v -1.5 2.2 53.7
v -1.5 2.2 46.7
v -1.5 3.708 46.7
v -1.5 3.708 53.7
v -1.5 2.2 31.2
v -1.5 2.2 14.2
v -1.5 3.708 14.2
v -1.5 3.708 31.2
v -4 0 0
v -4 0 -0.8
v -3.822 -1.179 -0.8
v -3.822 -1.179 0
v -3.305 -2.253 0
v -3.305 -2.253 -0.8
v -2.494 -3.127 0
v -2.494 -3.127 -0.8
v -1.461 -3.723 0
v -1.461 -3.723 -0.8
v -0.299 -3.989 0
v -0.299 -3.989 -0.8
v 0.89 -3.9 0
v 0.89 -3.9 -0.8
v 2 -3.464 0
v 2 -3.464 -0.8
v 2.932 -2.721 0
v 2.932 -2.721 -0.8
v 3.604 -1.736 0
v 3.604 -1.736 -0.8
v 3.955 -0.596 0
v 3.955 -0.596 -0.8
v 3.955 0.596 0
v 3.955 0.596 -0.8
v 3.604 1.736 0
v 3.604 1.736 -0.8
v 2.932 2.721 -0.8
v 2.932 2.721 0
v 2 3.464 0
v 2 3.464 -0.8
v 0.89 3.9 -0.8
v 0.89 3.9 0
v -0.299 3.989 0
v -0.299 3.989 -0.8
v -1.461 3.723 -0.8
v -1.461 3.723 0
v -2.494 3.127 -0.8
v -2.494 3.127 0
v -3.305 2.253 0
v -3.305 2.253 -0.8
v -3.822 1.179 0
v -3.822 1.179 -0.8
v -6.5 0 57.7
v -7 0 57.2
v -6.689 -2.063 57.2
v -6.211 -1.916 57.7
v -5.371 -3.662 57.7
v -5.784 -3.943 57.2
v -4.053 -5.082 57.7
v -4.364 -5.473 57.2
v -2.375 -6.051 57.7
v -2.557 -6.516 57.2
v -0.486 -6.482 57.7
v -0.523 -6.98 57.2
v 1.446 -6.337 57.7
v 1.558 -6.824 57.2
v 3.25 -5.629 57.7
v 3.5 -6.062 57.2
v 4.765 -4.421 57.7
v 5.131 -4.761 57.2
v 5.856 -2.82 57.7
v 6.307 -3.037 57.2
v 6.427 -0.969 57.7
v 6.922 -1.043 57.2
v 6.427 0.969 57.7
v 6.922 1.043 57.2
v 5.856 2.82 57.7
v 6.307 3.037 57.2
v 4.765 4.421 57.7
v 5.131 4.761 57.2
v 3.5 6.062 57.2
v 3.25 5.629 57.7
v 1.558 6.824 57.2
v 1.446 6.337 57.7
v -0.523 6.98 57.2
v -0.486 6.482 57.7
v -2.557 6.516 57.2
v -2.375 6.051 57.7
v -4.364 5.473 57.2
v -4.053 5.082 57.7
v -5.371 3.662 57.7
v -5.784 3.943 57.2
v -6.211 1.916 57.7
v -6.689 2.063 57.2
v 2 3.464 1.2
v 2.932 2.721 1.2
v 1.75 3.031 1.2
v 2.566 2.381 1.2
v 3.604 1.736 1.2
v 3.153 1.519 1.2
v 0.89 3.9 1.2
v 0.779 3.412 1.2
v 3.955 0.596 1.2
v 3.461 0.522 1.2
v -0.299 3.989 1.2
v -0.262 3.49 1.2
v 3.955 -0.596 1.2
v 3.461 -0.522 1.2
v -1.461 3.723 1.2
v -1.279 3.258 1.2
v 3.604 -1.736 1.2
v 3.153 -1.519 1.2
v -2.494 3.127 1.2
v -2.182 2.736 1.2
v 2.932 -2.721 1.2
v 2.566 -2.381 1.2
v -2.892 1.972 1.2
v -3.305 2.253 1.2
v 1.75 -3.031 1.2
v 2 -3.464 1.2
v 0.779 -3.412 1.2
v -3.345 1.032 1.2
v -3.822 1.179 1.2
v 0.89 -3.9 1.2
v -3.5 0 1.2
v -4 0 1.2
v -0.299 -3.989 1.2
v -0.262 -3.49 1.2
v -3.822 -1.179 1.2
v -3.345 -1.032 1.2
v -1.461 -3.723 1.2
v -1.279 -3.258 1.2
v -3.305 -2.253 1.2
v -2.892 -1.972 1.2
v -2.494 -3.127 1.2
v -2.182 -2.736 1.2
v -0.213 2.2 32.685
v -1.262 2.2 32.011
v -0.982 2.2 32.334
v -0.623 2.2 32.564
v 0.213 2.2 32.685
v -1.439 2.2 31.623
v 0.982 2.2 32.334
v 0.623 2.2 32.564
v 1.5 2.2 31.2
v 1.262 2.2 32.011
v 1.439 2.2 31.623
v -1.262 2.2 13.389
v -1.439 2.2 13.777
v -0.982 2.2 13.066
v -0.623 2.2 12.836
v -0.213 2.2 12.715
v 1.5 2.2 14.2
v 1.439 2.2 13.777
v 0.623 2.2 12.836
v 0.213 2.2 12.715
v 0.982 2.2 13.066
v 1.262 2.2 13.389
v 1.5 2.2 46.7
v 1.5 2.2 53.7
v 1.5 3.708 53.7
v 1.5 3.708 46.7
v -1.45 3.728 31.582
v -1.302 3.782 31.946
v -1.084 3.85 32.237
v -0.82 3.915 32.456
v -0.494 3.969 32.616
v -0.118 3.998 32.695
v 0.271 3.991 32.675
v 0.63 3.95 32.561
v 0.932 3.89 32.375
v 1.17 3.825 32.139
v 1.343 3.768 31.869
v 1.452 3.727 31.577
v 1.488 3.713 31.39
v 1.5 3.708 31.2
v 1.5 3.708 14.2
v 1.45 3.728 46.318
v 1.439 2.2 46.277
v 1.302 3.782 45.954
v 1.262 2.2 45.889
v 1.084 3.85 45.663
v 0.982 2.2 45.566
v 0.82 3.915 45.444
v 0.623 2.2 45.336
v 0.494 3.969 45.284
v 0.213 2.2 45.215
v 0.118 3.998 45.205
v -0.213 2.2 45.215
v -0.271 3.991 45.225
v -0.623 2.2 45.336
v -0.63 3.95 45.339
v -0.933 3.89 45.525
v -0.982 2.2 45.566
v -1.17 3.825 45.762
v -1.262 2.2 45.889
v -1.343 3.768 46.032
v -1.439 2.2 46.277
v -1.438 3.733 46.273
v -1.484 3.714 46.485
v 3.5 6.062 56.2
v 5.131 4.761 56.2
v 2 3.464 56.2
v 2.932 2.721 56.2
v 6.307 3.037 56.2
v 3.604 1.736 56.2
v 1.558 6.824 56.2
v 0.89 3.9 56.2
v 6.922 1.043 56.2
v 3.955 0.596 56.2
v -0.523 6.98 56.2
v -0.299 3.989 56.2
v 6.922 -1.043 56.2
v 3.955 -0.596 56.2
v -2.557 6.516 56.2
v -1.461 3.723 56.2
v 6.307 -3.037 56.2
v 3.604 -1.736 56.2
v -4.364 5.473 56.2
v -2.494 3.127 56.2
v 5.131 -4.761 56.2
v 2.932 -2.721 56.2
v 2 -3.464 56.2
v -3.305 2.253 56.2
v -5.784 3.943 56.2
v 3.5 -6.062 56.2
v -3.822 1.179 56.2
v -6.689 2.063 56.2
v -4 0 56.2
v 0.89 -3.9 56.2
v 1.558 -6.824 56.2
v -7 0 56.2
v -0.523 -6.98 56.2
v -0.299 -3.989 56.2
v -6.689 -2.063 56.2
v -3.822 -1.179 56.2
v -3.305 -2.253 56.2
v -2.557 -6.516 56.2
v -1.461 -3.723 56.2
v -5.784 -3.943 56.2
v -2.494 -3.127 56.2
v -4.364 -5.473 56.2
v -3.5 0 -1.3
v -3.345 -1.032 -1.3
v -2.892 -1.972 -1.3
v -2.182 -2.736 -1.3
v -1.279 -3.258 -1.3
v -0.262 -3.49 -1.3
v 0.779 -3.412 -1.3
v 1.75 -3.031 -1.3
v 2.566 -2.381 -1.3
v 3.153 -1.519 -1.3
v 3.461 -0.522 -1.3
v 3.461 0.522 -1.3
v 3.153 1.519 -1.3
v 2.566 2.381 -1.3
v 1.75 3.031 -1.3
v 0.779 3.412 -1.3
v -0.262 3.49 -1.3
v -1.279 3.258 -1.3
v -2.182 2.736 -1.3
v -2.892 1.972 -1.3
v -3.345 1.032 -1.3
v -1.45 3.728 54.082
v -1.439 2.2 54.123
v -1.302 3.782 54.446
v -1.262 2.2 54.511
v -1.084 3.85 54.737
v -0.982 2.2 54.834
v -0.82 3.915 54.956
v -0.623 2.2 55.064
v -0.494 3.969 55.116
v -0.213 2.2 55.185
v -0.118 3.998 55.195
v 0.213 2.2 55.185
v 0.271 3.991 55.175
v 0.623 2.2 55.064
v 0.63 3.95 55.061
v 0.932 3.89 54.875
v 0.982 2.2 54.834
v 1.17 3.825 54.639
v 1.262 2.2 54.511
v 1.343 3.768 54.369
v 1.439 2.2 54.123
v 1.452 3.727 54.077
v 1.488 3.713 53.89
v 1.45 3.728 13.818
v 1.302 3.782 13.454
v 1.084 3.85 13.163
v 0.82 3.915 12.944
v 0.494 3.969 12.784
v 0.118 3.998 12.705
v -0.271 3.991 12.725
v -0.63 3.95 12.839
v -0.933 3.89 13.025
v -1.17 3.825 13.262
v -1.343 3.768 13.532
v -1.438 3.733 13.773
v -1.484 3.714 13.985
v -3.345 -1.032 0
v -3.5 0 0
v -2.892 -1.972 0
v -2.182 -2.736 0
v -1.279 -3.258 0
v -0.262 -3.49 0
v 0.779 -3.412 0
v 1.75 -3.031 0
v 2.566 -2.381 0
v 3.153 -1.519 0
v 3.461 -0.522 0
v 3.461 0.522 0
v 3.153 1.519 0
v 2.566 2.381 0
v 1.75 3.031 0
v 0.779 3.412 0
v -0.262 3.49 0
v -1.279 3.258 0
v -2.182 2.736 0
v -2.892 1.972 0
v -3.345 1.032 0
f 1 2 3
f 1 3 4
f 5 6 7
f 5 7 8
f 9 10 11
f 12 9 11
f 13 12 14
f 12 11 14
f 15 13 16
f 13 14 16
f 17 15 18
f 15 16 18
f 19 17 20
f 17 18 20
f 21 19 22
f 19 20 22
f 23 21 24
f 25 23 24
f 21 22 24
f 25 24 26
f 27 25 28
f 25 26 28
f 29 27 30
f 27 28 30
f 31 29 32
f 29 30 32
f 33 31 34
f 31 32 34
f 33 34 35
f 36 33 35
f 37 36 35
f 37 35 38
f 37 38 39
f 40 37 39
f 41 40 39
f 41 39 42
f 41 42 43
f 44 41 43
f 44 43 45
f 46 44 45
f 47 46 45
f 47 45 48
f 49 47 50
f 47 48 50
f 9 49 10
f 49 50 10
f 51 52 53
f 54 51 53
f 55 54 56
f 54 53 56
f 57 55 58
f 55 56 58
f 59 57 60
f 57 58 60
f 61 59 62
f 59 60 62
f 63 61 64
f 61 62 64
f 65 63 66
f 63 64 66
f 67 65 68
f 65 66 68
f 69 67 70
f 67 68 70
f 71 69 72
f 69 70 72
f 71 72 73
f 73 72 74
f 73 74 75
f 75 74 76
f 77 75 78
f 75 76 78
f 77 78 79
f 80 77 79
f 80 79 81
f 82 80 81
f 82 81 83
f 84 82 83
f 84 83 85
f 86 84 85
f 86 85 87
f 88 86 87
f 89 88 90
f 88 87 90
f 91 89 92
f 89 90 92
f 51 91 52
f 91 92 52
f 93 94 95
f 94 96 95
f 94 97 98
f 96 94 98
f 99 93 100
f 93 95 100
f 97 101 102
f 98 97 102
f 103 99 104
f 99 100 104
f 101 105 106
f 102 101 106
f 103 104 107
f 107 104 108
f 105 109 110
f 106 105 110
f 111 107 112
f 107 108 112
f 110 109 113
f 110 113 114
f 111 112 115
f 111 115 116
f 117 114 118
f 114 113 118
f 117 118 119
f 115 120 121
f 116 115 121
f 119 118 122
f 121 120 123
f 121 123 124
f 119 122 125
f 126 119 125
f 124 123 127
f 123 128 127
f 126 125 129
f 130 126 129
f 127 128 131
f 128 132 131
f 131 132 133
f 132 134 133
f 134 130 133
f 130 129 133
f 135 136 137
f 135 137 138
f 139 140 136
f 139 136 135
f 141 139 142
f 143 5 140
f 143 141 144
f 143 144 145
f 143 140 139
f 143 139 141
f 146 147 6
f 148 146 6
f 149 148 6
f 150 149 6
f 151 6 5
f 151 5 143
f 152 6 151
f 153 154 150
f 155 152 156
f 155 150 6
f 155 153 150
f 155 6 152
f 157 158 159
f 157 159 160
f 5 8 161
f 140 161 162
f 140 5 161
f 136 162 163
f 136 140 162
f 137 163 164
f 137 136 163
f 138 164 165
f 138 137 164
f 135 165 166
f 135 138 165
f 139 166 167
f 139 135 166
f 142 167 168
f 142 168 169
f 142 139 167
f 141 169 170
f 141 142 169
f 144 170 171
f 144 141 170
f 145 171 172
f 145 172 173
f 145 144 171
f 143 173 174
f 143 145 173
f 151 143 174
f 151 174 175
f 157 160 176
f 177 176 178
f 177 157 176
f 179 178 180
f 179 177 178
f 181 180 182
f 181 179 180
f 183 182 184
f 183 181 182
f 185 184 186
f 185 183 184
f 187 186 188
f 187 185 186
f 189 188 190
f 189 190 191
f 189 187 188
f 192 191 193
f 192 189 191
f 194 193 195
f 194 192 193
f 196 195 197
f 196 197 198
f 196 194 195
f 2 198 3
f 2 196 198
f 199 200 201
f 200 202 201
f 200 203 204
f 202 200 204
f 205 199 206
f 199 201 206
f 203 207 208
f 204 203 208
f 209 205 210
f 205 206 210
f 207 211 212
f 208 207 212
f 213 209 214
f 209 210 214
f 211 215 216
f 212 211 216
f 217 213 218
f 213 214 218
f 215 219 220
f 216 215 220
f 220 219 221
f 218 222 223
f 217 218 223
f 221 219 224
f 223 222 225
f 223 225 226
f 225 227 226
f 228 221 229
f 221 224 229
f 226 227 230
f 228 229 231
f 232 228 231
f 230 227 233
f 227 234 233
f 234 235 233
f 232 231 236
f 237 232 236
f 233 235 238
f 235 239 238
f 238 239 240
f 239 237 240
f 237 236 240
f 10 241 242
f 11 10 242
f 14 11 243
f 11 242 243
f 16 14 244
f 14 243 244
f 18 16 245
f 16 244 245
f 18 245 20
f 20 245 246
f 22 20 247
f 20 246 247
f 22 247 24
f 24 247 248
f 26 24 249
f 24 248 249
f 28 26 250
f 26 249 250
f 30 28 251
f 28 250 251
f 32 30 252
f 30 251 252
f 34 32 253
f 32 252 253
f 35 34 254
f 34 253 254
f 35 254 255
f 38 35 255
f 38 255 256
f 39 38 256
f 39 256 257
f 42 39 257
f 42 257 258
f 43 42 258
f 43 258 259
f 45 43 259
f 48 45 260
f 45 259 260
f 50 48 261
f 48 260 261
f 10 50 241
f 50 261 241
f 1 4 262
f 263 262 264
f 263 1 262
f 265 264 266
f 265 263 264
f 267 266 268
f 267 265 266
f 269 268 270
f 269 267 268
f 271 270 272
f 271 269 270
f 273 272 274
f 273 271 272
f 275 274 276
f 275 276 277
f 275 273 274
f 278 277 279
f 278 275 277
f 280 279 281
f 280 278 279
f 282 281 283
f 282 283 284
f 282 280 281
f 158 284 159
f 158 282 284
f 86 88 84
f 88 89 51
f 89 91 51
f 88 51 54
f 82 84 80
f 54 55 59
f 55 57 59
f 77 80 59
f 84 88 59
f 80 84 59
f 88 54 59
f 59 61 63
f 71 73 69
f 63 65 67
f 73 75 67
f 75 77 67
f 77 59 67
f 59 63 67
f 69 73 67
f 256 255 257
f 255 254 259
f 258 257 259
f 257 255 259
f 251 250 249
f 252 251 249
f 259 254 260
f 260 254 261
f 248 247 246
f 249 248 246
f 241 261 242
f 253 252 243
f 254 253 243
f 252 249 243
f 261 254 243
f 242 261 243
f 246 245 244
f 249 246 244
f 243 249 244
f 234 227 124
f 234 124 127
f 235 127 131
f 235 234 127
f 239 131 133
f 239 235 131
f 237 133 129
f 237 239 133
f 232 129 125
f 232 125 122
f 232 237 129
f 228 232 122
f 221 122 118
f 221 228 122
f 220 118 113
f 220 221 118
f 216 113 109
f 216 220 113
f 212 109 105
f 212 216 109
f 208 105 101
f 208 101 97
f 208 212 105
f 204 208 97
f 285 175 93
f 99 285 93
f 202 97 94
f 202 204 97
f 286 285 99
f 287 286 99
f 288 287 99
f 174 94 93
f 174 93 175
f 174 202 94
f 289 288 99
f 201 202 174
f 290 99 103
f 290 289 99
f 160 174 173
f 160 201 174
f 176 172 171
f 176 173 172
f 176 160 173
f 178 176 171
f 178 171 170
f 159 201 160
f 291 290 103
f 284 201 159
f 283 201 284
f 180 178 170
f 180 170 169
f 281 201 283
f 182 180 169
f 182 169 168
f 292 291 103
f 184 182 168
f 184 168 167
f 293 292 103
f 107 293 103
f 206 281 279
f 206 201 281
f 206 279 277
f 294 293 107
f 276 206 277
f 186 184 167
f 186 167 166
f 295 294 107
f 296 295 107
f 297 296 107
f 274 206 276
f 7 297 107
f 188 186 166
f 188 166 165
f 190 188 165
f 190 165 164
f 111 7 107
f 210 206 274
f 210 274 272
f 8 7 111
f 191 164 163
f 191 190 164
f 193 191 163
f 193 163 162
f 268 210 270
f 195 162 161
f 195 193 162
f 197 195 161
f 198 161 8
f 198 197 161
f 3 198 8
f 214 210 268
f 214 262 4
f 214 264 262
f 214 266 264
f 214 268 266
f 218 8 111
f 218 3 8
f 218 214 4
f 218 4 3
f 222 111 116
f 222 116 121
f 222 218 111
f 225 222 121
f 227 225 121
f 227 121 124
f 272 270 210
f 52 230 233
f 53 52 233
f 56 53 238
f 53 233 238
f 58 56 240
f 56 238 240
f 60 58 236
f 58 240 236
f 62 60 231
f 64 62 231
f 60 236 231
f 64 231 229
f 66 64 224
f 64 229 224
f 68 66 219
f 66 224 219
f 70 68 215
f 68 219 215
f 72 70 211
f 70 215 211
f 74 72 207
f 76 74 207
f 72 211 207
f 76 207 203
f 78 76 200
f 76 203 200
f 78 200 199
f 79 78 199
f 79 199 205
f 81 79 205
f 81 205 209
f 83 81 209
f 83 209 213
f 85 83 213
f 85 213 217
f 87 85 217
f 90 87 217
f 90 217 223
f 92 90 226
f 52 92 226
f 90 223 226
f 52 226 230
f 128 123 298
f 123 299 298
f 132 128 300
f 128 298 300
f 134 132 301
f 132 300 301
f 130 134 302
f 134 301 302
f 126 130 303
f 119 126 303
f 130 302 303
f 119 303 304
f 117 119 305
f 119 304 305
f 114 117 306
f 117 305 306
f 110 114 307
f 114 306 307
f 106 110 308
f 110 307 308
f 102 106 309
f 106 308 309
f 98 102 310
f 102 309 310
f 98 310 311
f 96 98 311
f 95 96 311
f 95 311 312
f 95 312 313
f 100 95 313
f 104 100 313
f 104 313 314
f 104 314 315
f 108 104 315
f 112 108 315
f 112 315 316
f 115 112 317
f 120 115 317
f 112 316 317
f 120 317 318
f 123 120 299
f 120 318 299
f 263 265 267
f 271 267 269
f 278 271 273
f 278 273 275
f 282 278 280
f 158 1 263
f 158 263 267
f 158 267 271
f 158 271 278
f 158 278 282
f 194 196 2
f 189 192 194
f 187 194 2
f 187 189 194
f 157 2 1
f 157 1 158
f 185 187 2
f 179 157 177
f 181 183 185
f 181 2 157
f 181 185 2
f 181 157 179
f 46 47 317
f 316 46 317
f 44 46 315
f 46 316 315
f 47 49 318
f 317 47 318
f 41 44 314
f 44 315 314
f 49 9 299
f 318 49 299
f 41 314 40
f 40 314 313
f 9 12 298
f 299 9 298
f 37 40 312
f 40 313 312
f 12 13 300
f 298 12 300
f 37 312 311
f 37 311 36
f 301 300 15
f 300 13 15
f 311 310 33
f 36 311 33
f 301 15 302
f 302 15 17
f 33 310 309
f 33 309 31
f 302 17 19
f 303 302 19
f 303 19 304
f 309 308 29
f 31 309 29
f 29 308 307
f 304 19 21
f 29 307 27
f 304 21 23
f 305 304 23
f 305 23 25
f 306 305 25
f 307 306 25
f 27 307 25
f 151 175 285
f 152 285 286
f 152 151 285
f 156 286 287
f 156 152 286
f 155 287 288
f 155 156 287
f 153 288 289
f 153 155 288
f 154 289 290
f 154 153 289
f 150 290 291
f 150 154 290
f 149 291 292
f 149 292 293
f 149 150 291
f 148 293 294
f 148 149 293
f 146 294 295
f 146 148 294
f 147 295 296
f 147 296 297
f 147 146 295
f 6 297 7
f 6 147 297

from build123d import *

# Parameters (mm, degrees)
CHAMFER1_SIZE      = 0.5
CUT_EXTRUDE1_DEPTH = 10
EXTRUDE1_DEPTH     = 2.2
EXTRUDE2_DEPTH     = 2.2


with BuildPart() as part:
    # Sketch1 → Revolve1 (revolve)
    with BuildSketch(Plane(origin=(0, 0, 0), x_dir=(1, 0, 0), z_dir=(0, 1, 0))):
        Polygon((0, -57.7), (-7, -57.7), (-7, -56.2), (-4, -56.2), (-4, -19.947651257), (-4, -1.2), (-3.5, -1.2), (-3.5, 0), (-4, 0), (-4, 1.3), (0, 1.3), align=None)
    revolve(axis=Axis((0, 0, -49.376724138), (0, 0, 1)))

    # Chamfer1
    chamfer1_edges = [part.edges().sort_by_distance(p)[0] for p in [
        (4, 0, -1.3),
        (7, 0, 57.7),
    ]]
    chamfer(chamfer1_edges, length=CHAMFER1_SIZE)

    # Sketch2 → Cut-Extrude1 (cut)
    with BuildSketch(Plane(origin=(0, 0, 0), x_dir=(1, 0, 0), z_dir=(0, 1, 0))):
        with BuildLine():
            Line((-1.5, -14.2), (-1.5, -31.2))
            ThreePointArc((-1.5, -31.2), (0, -32.7), (1.5, -31.2))
            Line((1.5, -31.2), (1.5, -14.2))
            ThreePointArc((1.5, -14.2), (0, -12.7), (-1.5, -14.2))
        make_face()
        with BuildLine():
            Line((-1.5, -46.7), (-1.5, -53.7))
            ThreePointArc((-1.5, -53.7), (0, -55.2), (1.5, -53.7))
            Line((1.5, -53.7), (1.5, -46.7))
            ThreePointArc((1.5, -46.7), (0, -45.2), (-1.5, -46.7))
        make_face()
    extrude(amount=CUT_EXTRUDE1_DEPTH, mode=Mode.SUBTRACT)

    # Sketch3 → Extrude1 (add)
    with BuildSketch(Plane(origin=(0, 0, 0), x_dir=(1, 0, 0), z_dir=(0, 1, 0))):
        with BuildLine():
            Line((1.5, -31.2), (1.5, -14.2))
            ThreePointArc((1.5, -14.2), (0, -12.7), (-1.5, -14.2))
            Line((-1.5, -14.2), (-1.5, -31.2))
            ThreePointArc((-1.5, -31.2), (0, -32.7), (1.5, -31.2))
        make_face()
    extrude(amount=EXTRUDE1_DEPTH)

    # Sketch4 → Extrude2 (add)
    with BuildSketch(Plane(origin=(0, 0, 0), x_dir=(1, 0, 0), z_dir=(0, 1, 0))):
        with BuildLine():
            Line((-1.5, -46.7), (-1.5, -53.7))
            ThreePointArc((-1.5, -53.7), (0, -55.2), (1.5, -53.7))
            Line((1.5, -53.7), (1.5, -46.7))
            ThreePointArc((1.5, -46.7), (0, -45.2), (-1.5, -46.7))
        make_face()
    extrude(amount=EXTRUDE2_DEPTH)


solid = part.part
